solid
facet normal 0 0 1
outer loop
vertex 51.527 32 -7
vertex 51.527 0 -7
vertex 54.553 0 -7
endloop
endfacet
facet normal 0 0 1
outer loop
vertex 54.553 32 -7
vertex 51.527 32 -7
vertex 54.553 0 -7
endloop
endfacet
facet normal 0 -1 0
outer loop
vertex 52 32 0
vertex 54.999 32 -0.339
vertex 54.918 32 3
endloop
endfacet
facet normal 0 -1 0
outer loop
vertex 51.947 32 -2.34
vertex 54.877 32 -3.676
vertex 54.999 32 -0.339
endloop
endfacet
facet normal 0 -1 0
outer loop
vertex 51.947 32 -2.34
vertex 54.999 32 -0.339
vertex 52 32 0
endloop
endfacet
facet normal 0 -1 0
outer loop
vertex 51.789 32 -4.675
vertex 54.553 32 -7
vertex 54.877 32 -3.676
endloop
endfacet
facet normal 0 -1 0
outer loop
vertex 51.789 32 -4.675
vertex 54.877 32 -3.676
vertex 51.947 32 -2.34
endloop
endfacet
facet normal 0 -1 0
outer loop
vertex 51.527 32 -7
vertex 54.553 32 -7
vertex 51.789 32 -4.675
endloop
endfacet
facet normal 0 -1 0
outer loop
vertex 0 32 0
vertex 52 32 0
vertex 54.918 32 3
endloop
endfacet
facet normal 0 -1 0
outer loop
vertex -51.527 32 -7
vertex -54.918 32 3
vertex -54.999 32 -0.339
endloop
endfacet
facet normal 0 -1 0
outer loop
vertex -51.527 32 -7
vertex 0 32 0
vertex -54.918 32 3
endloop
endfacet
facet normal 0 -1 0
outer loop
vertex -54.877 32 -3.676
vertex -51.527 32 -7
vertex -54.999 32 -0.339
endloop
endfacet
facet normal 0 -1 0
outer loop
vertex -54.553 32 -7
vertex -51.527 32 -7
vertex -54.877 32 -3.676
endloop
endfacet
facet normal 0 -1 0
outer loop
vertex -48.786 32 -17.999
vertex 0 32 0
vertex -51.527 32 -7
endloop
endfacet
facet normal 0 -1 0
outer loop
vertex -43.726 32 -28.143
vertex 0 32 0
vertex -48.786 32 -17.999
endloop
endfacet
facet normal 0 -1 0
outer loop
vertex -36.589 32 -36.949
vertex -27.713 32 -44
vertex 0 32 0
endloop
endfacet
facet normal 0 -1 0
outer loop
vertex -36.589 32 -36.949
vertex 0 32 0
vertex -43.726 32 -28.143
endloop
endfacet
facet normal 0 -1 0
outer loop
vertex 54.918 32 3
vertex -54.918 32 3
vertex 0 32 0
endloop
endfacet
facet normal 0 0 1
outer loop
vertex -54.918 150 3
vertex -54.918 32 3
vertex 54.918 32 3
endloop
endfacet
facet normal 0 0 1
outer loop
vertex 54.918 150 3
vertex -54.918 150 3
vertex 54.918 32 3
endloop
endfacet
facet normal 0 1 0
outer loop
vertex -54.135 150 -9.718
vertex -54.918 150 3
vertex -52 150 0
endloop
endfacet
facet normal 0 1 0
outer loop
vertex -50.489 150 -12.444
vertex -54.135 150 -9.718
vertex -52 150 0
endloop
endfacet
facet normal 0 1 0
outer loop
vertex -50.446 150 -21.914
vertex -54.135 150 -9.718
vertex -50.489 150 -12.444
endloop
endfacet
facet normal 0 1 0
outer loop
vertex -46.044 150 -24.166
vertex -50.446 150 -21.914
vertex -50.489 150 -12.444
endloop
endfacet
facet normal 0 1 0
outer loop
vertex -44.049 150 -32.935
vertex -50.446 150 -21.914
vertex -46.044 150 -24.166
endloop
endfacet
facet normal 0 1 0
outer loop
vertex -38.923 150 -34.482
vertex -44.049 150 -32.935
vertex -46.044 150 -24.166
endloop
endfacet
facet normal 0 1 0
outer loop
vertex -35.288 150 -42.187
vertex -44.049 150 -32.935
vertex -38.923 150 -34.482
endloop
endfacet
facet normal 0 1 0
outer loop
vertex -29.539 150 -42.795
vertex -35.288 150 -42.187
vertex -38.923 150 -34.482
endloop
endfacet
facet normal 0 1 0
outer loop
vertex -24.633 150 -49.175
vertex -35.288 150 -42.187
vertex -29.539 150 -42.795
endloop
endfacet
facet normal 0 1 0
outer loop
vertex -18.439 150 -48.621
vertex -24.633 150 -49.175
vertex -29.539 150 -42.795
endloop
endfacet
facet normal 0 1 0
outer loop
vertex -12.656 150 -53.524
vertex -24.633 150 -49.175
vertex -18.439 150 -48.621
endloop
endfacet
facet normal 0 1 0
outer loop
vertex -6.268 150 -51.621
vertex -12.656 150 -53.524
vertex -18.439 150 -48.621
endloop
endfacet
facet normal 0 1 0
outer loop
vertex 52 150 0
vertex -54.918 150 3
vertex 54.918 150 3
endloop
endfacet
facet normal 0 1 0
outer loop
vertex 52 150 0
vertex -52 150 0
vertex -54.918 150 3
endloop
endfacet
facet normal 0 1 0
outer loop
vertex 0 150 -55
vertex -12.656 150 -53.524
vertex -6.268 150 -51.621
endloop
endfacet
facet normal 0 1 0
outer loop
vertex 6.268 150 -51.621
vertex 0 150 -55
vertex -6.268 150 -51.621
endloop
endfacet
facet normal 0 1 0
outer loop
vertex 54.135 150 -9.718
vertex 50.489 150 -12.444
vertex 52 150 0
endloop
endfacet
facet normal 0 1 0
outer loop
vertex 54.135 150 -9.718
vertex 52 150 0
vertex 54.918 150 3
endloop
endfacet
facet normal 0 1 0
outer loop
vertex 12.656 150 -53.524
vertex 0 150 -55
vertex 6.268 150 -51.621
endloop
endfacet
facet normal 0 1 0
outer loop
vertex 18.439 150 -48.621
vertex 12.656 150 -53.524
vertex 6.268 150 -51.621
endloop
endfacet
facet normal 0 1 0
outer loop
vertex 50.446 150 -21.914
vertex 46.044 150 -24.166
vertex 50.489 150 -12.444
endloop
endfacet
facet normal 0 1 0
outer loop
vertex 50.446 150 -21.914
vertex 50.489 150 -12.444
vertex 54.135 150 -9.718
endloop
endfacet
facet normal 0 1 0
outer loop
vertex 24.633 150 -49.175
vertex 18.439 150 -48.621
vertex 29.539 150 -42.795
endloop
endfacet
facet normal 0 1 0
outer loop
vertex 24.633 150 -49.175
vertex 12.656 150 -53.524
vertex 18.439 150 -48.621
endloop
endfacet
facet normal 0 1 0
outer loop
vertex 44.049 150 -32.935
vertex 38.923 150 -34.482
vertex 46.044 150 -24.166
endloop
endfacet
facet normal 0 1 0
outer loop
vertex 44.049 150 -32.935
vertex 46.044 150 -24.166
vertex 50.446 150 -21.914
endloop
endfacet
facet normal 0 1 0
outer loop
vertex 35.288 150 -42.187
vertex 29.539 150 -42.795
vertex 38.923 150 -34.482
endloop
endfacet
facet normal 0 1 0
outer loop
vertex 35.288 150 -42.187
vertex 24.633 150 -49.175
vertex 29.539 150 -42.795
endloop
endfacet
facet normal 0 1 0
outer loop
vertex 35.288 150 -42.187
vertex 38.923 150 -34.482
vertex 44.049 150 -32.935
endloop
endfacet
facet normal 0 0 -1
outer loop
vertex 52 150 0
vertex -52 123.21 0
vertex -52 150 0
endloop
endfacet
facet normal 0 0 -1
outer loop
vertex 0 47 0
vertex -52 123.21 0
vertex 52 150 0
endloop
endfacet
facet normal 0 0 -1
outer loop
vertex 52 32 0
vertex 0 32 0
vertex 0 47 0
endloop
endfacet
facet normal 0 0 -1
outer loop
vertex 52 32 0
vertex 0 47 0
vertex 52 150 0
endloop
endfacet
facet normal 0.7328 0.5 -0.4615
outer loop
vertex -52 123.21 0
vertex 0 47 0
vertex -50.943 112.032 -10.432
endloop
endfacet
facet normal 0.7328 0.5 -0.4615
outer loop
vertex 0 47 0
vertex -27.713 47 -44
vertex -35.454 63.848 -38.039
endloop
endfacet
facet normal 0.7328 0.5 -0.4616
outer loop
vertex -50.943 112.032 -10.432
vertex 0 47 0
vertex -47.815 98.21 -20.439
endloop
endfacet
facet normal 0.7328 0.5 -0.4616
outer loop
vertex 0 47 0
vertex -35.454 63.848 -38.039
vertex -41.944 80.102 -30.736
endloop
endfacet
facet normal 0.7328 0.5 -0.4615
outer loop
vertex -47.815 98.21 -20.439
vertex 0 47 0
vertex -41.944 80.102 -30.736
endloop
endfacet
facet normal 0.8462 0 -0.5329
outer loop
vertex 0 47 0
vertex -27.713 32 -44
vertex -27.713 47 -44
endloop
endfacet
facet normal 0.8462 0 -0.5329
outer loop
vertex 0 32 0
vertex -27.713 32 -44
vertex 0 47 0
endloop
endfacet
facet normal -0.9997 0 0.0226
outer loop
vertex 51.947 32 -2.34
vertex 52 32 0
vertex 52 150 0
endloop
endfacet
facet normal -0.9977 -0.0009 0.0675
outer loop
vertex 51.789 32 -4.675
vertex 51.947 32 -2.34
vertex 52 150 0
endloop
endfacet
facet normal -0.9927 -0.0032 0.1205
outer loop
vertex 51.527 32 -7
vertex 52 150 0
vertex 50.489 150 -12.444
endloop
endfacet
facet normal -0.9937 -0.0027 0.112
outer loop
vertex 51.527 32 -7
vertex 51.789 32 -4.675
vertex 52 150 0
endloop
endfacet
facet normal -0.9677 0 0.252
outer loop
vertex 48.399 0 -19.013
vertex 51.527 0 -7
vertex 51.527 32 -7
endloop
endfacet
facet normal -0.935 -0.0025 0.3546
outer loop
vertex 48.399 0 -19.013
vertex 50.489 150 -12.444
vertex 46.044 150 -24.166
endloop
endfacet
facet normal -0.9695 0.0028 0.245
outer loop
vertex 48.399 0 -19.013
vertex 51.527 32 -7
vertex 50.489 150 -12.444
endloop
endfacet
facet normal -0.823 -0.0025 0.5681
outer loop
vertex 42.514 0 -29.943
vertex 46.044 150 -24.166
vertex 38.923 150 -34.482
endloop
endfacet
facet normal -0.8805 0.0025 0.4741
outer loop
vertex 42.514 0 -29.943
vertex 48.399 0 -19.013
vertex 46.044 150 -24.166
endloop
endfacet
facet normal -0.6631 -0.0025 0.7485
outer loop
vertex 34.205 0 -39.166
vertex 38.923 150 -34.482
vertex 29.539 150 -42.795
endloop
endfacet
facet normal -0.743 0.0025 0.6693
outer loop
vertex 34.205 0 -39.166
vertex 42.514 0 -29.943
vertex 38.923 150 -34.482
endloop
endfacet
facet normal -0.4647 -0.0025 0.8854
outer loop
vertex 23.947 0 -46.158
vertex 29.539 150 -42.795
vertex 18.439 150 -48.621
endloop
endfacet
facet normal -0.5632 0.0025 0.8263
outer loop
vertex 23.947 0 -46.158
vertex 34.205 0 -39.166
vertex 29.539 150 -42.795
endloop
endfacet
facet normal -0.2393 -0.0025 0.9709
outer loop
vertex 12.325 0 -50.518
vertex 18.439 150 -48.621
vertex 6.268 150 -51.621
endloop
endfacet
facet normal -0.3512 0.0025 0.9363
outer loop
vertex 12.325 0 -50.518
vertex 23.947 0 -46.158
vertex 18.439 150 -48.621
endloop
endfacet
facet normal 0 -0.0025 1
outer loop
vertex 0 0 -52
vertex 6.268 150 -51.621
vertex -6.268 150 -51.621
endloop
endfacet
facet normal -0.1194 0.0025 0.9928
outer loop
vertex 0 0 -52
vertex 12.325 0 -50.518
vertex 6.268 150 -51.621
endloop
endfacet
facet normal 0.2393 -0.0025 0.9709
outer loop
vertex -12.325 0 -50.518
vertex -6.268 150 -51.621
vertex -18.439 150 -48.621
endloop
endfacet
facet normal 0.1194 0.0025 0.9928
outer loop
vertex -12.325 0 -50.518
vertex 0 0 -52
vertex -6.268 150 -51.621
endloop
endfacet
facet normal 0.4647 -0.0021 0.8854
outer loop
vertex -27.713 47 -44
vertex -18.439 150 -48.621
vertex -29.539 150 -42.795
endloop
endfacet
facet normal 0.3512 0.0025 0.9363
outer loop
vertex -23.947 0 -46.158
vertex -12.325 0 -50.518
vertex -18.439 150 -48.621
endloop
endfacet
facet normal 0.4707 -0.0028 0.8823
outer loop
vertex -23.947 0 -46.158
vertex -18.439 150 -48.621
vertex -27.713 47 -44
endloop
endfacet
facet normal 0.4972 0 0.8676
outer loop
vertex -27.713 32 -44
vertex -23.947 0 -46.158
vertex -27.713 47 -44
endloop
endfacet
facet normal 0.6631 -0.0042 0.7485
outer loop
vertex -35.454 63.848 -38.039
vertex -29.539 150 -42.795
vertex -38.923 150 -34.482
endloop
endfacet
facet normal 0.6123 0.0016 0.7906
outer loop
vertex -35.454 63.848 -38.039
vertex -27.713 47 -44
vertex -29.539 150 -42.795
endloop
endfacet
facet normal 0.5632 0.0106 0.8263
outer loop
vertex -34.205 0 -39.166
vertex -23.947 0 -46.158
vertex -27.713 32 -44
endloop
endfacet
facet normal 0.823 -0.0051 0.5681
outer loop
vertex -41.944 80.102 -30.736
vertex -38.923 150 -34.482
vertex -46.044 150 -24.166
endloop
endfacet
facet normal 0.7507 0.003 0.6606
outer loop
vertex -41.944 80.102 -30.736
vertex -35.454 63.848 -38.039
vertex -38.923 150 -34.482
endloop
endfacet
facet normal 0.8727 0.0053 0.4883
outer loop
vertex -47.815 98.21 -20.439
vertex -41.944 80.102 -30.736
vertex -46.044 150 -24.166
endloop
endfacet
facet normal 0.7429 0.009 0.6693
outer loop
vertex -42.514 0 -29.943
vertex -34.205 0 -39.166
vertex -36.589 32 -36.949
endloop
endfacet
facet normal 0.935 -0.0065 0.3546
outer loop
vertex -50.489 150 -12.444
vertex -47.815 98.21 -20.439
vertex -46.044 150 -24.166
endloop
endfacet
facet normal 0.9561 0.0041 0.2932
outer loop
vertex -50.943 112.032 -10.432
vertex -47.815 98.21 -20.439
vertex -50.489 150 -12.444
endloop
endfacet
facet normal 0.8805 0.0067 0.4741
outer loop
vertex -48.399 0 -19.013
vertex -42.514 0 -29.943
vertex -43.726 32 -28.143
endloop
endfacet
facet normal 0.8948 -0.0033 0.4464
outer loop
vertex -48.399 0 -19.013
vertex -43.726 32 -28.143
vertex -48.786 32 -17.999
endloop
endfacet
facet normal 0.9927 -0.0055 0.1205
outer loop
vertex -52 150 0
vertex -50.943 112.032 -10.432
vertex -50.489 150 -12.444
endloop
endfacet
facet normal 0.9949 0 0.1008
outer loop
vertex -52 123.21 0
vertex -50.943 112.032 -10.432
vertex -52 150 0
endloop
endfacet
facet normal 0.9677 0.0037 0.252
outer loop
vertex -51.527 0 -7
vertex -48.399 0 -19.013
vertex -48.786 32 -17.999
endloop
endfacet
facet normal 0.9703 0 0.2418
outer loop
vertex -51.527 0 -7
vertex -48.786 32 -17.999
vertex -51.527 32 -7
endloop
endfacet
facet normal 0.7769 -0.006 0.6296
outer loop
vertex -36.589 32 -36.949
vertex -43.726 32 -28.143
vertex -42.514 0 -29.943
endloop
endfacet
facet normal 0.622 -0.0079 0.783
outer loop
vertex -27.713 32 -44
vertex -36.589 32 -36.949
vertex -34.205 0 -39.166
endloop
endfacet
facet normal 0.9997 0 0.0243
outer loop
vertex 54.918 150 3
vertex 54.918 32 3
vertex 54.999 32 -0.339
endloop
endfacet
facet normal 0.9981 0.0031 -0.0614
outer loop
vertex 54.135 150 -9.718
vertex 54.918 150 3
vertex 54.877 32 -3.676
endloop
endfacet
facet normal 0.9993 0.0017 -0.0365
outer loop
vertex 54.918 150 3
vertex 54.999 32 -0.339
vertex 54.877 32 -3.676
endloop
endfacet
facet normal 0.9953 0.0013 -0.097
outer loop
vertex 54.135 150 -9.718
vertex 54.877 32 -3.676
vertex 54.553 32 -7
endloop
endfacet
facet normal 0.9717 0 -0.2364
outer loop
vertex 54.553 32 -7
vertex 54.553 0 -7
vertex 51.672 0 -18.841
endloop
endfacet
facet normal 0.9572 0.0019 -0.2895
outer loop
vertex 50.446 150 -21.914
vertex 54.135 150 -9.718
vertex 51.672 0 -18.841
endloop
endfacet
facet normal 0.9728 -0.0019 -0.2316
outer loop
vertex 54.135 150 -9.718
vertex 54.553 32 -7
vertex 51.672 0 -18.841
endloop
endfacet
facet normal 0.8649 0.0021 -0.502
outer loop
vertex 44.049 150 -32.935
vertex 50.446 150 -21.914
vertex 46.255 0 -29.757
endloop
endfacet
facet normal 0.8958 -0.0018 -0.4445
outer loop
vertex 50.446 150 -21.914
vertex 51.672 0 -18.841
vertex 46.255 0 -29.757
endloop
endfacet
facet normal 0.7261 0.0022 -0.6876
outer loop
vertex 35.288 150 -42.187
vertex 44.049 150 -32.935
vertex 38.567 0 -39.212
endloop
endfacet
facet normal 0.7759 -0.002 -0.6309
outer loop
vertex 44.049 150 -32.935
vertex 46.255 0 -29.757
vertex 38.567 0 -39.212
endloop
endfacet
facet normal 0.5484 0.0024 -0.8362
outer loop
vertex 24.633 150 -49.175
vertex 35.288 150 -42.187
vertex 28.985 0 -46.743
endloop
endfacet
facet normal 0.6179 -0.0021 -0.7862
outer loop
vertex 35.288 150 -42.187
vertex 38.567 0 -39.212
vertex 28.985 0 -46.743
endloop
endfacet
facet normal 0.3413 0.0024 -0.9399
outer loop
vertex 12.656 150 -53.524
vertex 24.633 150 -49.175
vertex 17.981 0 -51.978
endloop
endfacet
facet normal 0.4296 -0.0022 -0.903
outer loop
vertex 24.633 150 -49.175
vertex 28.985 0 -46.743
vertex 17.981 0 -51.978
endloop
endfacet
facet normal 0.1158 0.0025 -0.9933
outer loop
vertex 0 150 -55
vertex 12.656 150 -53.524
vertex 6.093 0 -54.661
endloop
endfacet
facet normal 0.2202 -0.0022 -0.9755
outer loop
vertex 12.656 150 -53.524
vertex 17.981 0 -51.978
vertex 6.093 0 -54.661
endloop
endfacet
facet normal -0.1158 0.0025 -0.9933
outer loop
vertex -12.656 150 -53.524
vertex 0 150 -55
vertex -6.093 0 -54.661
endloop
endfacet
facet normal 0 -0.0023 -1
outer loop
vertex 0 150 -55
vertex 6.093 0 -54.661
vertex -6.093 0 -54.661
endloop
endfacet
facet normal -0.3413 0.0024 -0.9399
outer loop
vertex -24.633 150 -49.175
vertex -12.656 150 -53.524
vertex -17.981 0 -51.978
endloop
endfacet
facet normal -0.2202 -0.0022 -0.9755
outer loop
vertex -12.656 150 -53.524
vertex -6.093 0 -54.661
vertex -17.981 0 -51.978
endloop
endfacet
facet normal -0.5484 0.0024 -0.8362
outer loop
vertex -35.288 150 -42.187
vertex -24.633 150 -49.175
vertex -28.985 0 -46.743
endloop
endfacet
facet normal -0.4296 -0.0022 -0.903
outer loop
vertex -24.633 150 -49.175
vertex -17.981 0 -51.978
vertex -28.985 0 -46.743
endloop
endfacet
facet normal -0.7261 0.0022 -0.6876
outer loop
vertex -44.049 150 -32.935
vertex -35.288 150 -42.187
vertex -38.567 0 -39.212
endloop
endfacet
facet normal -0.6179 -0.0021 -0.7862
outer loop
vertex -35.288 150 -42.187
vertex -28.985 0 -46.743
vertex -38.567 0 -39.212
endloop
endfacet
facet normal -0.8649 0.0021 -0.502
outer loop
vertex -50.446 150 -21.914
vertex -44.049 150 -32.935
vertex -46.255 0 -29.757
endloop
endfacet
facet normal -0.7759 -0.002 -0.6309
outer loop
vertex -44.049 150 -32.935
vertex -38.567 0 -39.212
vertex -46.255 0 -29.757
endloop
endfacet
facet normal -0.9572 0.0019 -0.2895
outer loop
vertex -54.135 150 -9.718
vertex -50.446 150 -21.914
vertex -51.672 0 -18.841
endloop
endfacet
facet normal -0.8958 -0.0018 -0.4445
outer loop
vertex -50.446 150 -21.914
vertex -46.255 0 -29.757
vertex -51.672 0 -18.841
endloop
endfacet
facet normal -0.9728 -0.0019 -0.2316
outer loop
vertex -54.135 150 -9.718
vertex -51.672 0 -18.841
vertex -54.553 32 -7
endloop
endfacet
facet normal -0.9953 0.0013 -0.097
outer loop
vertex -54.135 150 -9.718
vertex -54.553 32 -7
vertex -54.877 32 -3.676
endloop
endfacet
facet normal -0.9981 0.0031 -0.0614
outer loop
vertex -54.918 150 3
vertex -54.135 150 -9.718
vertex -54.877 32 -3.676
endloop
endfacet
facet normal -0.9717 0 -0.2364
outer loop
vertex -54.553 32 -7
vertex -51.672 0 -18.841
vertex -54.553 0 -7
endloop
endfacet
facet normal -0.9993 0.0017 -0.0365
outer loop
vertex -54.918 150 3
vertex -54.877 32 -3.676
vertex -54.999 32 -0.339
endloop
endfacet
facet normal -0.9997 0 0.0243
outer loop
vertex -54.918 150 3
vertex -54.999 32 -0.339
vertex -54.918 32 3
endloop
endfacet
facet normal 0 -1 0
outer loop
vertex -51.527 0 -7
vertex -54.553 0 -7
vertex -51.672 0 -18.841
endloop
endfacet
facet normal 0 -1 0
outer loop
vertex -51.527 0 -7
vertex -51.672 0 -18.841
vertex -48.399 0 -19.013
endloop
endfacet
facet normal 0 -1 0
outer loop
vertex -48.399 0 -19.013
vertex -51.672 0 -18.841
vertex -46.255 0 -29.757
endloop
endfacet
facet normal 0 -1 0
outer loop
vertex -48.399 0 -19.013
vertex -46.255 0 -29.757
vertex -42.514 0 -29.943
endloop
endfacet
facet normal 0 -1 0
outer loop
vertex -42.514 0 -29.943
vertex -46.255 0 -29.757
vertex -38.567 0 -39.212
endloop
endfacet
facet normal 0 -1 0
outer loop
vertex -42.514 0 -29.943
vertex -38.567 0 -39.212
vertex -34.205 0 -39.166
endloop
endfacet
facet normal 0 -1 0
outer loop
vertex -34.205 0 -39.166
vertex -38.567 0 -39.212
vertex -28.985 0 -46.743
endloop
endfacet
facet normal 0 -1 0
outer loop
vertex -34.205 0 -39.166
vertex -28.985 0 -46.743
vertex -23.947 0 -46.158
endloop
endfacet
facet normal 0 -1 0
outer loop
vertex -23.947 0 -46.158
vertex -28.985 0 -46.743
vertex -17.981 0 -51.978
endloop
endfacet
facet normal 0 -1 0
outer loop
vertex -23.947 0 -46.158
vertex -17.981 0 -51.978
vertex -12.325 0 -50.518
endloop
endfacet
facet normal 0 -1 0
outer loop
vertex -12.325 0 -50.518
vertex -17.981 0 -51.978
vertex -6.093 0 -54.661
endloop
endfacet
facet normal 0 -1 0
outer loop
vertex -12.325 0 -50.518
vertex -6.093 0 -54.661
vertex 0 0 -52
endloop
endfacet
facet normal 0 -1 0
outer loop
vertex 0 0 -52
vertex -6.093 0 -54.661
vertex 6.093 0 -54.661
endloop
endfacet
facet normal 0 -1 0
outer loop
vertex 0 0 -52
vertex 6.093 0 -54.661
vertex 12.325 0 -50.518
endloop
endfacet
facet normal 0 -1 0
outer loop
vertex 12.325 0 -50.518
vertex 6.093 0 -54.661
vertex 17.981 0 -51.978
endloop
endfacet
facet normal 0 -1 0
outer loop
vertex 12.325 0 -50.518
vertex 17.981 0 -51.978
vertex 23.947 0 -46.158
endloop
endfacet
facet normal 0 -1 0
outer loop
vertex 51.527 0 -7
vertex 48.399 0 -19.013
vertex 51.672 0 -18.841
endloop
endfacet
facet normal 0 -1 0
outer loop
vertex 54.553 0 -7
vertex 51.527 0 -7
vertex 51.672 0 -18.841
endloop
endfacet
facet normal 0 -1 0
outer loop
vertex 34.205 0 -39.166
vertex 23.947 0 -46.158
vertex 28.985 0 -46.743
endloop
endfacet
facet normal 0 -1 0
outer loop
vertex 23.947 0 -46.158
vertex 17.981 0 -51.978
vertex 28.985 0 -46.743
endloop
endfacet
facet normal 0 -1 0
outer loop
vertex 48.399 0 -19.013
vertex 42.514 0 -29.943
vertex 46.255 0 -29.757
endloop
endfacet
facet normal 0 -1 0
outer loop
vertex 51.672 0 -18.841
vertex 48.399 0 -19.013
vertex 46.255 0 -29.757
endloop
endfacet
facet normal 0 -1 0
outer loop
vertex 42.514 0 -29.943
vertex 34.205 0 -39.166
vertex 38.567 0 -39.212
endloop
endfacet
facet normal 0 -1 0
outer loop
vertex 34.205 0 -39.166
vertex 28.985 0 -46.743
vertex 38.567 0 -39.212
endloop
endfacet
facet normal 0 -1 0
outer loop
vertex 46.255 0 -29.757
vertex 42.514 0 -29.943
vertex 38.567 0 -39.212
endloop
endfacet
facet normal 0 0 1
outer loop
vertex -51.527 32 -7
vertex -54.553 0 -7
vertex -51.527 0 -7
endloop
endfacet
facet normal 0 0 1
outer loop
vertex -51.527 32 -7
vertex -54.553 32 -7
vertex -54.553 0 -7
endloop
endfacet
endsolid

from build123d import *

# Parameters (mm, degrees)
BOSS_EXTRUDE1_DEPTH = 150
SKETCH3_W           = 109.836241742
SKETCH3_H           = 14
CUT_EXTRUDE3_DEPTH  = 5
CUT_EXTRUDE4_DEPTH  = 10
BOSS_EXTRUDE2_DEPTH = 15
DRAFT2_ANGLE        = 60


with BuildPart() as part:
    # Sketch1 → Boss-Extrude1 (new body)
    with BuildSketch(Plane(origin=(0, 0, 0), x_dir=(1, 0, 0), z_dir=(0, 1, 0))):
        with BuildLine():
            Line((-54.918120871, -3), (54.918120871, -3))
            ThreePointArc((54.918120871, -3), (0, 55), (-54.918120871, -3))
        make_face()
        with BuildLine():
            Line((-52, 0), (52, 0))
            ThreePointArc((52, 0), (0, 52), (-52, 0))
        make_face(mode=Mode.SUBTRACT)
    extrude(amount=BOSS_EXTRUDE1_DEPTH)

    # Sketch3 → Cut-Extrude3 (cut)
    with BuildSketch(Plane.XY.offset(3)):
        with Locations((0, 25)):
            Rectangle(SKETCH3_W, SKETCH3_H)
    extrude(amount=-CUT_EXTRUDE3_DEPTH, mode=Mode.SUBTRACT)

    # Sketch4 → Cut-Extrude4 (cut)
    with BuildSketch(Plane.XY.offset(3)):
        Polygon((0, 0), (62.110162625, 0), (62.110162625, 32), (-64.723211538, 32), (-64.723211538, 0), align=None)
    extrude(amount=-CUT_EXTRUDE4_DEPTH, mode=Mode.SUBTRACT)

    # Sketch6 → Boss-Extrude2 (add)
    with BuildSketch(Plane(origin=(0, 32, 0), x_dir=(-1, 0, 0), z_dir=(0, -1, 0))):
        with BuildLine():
            Line((27.712812921, 44), (0, 0))
            Line((0, 0), (52, 0))
            ThreePointArc((52, 0), (45.525082492, 25.129004438), (27.712812921, 44))
        make_face()
    extrude(amount=-BOSS_EXTRUDE2_DEPTH)

    # Draft2
    draft2_faces = [part.faces().sort_by_distance(p)[0] for p in [
        (-29.079569776, 47, -16.051385257),
    ]]
    draft(draft2_faces, Plane(origin=(-27.712812921, 47, -44), x_dir=(0.5329387100211931, 0, 0.8461538461538461), z_dir=(0.8461538461538461, 0, -0.5329387100211931)), DRAFT2_ANGLE)


solid = part.part
